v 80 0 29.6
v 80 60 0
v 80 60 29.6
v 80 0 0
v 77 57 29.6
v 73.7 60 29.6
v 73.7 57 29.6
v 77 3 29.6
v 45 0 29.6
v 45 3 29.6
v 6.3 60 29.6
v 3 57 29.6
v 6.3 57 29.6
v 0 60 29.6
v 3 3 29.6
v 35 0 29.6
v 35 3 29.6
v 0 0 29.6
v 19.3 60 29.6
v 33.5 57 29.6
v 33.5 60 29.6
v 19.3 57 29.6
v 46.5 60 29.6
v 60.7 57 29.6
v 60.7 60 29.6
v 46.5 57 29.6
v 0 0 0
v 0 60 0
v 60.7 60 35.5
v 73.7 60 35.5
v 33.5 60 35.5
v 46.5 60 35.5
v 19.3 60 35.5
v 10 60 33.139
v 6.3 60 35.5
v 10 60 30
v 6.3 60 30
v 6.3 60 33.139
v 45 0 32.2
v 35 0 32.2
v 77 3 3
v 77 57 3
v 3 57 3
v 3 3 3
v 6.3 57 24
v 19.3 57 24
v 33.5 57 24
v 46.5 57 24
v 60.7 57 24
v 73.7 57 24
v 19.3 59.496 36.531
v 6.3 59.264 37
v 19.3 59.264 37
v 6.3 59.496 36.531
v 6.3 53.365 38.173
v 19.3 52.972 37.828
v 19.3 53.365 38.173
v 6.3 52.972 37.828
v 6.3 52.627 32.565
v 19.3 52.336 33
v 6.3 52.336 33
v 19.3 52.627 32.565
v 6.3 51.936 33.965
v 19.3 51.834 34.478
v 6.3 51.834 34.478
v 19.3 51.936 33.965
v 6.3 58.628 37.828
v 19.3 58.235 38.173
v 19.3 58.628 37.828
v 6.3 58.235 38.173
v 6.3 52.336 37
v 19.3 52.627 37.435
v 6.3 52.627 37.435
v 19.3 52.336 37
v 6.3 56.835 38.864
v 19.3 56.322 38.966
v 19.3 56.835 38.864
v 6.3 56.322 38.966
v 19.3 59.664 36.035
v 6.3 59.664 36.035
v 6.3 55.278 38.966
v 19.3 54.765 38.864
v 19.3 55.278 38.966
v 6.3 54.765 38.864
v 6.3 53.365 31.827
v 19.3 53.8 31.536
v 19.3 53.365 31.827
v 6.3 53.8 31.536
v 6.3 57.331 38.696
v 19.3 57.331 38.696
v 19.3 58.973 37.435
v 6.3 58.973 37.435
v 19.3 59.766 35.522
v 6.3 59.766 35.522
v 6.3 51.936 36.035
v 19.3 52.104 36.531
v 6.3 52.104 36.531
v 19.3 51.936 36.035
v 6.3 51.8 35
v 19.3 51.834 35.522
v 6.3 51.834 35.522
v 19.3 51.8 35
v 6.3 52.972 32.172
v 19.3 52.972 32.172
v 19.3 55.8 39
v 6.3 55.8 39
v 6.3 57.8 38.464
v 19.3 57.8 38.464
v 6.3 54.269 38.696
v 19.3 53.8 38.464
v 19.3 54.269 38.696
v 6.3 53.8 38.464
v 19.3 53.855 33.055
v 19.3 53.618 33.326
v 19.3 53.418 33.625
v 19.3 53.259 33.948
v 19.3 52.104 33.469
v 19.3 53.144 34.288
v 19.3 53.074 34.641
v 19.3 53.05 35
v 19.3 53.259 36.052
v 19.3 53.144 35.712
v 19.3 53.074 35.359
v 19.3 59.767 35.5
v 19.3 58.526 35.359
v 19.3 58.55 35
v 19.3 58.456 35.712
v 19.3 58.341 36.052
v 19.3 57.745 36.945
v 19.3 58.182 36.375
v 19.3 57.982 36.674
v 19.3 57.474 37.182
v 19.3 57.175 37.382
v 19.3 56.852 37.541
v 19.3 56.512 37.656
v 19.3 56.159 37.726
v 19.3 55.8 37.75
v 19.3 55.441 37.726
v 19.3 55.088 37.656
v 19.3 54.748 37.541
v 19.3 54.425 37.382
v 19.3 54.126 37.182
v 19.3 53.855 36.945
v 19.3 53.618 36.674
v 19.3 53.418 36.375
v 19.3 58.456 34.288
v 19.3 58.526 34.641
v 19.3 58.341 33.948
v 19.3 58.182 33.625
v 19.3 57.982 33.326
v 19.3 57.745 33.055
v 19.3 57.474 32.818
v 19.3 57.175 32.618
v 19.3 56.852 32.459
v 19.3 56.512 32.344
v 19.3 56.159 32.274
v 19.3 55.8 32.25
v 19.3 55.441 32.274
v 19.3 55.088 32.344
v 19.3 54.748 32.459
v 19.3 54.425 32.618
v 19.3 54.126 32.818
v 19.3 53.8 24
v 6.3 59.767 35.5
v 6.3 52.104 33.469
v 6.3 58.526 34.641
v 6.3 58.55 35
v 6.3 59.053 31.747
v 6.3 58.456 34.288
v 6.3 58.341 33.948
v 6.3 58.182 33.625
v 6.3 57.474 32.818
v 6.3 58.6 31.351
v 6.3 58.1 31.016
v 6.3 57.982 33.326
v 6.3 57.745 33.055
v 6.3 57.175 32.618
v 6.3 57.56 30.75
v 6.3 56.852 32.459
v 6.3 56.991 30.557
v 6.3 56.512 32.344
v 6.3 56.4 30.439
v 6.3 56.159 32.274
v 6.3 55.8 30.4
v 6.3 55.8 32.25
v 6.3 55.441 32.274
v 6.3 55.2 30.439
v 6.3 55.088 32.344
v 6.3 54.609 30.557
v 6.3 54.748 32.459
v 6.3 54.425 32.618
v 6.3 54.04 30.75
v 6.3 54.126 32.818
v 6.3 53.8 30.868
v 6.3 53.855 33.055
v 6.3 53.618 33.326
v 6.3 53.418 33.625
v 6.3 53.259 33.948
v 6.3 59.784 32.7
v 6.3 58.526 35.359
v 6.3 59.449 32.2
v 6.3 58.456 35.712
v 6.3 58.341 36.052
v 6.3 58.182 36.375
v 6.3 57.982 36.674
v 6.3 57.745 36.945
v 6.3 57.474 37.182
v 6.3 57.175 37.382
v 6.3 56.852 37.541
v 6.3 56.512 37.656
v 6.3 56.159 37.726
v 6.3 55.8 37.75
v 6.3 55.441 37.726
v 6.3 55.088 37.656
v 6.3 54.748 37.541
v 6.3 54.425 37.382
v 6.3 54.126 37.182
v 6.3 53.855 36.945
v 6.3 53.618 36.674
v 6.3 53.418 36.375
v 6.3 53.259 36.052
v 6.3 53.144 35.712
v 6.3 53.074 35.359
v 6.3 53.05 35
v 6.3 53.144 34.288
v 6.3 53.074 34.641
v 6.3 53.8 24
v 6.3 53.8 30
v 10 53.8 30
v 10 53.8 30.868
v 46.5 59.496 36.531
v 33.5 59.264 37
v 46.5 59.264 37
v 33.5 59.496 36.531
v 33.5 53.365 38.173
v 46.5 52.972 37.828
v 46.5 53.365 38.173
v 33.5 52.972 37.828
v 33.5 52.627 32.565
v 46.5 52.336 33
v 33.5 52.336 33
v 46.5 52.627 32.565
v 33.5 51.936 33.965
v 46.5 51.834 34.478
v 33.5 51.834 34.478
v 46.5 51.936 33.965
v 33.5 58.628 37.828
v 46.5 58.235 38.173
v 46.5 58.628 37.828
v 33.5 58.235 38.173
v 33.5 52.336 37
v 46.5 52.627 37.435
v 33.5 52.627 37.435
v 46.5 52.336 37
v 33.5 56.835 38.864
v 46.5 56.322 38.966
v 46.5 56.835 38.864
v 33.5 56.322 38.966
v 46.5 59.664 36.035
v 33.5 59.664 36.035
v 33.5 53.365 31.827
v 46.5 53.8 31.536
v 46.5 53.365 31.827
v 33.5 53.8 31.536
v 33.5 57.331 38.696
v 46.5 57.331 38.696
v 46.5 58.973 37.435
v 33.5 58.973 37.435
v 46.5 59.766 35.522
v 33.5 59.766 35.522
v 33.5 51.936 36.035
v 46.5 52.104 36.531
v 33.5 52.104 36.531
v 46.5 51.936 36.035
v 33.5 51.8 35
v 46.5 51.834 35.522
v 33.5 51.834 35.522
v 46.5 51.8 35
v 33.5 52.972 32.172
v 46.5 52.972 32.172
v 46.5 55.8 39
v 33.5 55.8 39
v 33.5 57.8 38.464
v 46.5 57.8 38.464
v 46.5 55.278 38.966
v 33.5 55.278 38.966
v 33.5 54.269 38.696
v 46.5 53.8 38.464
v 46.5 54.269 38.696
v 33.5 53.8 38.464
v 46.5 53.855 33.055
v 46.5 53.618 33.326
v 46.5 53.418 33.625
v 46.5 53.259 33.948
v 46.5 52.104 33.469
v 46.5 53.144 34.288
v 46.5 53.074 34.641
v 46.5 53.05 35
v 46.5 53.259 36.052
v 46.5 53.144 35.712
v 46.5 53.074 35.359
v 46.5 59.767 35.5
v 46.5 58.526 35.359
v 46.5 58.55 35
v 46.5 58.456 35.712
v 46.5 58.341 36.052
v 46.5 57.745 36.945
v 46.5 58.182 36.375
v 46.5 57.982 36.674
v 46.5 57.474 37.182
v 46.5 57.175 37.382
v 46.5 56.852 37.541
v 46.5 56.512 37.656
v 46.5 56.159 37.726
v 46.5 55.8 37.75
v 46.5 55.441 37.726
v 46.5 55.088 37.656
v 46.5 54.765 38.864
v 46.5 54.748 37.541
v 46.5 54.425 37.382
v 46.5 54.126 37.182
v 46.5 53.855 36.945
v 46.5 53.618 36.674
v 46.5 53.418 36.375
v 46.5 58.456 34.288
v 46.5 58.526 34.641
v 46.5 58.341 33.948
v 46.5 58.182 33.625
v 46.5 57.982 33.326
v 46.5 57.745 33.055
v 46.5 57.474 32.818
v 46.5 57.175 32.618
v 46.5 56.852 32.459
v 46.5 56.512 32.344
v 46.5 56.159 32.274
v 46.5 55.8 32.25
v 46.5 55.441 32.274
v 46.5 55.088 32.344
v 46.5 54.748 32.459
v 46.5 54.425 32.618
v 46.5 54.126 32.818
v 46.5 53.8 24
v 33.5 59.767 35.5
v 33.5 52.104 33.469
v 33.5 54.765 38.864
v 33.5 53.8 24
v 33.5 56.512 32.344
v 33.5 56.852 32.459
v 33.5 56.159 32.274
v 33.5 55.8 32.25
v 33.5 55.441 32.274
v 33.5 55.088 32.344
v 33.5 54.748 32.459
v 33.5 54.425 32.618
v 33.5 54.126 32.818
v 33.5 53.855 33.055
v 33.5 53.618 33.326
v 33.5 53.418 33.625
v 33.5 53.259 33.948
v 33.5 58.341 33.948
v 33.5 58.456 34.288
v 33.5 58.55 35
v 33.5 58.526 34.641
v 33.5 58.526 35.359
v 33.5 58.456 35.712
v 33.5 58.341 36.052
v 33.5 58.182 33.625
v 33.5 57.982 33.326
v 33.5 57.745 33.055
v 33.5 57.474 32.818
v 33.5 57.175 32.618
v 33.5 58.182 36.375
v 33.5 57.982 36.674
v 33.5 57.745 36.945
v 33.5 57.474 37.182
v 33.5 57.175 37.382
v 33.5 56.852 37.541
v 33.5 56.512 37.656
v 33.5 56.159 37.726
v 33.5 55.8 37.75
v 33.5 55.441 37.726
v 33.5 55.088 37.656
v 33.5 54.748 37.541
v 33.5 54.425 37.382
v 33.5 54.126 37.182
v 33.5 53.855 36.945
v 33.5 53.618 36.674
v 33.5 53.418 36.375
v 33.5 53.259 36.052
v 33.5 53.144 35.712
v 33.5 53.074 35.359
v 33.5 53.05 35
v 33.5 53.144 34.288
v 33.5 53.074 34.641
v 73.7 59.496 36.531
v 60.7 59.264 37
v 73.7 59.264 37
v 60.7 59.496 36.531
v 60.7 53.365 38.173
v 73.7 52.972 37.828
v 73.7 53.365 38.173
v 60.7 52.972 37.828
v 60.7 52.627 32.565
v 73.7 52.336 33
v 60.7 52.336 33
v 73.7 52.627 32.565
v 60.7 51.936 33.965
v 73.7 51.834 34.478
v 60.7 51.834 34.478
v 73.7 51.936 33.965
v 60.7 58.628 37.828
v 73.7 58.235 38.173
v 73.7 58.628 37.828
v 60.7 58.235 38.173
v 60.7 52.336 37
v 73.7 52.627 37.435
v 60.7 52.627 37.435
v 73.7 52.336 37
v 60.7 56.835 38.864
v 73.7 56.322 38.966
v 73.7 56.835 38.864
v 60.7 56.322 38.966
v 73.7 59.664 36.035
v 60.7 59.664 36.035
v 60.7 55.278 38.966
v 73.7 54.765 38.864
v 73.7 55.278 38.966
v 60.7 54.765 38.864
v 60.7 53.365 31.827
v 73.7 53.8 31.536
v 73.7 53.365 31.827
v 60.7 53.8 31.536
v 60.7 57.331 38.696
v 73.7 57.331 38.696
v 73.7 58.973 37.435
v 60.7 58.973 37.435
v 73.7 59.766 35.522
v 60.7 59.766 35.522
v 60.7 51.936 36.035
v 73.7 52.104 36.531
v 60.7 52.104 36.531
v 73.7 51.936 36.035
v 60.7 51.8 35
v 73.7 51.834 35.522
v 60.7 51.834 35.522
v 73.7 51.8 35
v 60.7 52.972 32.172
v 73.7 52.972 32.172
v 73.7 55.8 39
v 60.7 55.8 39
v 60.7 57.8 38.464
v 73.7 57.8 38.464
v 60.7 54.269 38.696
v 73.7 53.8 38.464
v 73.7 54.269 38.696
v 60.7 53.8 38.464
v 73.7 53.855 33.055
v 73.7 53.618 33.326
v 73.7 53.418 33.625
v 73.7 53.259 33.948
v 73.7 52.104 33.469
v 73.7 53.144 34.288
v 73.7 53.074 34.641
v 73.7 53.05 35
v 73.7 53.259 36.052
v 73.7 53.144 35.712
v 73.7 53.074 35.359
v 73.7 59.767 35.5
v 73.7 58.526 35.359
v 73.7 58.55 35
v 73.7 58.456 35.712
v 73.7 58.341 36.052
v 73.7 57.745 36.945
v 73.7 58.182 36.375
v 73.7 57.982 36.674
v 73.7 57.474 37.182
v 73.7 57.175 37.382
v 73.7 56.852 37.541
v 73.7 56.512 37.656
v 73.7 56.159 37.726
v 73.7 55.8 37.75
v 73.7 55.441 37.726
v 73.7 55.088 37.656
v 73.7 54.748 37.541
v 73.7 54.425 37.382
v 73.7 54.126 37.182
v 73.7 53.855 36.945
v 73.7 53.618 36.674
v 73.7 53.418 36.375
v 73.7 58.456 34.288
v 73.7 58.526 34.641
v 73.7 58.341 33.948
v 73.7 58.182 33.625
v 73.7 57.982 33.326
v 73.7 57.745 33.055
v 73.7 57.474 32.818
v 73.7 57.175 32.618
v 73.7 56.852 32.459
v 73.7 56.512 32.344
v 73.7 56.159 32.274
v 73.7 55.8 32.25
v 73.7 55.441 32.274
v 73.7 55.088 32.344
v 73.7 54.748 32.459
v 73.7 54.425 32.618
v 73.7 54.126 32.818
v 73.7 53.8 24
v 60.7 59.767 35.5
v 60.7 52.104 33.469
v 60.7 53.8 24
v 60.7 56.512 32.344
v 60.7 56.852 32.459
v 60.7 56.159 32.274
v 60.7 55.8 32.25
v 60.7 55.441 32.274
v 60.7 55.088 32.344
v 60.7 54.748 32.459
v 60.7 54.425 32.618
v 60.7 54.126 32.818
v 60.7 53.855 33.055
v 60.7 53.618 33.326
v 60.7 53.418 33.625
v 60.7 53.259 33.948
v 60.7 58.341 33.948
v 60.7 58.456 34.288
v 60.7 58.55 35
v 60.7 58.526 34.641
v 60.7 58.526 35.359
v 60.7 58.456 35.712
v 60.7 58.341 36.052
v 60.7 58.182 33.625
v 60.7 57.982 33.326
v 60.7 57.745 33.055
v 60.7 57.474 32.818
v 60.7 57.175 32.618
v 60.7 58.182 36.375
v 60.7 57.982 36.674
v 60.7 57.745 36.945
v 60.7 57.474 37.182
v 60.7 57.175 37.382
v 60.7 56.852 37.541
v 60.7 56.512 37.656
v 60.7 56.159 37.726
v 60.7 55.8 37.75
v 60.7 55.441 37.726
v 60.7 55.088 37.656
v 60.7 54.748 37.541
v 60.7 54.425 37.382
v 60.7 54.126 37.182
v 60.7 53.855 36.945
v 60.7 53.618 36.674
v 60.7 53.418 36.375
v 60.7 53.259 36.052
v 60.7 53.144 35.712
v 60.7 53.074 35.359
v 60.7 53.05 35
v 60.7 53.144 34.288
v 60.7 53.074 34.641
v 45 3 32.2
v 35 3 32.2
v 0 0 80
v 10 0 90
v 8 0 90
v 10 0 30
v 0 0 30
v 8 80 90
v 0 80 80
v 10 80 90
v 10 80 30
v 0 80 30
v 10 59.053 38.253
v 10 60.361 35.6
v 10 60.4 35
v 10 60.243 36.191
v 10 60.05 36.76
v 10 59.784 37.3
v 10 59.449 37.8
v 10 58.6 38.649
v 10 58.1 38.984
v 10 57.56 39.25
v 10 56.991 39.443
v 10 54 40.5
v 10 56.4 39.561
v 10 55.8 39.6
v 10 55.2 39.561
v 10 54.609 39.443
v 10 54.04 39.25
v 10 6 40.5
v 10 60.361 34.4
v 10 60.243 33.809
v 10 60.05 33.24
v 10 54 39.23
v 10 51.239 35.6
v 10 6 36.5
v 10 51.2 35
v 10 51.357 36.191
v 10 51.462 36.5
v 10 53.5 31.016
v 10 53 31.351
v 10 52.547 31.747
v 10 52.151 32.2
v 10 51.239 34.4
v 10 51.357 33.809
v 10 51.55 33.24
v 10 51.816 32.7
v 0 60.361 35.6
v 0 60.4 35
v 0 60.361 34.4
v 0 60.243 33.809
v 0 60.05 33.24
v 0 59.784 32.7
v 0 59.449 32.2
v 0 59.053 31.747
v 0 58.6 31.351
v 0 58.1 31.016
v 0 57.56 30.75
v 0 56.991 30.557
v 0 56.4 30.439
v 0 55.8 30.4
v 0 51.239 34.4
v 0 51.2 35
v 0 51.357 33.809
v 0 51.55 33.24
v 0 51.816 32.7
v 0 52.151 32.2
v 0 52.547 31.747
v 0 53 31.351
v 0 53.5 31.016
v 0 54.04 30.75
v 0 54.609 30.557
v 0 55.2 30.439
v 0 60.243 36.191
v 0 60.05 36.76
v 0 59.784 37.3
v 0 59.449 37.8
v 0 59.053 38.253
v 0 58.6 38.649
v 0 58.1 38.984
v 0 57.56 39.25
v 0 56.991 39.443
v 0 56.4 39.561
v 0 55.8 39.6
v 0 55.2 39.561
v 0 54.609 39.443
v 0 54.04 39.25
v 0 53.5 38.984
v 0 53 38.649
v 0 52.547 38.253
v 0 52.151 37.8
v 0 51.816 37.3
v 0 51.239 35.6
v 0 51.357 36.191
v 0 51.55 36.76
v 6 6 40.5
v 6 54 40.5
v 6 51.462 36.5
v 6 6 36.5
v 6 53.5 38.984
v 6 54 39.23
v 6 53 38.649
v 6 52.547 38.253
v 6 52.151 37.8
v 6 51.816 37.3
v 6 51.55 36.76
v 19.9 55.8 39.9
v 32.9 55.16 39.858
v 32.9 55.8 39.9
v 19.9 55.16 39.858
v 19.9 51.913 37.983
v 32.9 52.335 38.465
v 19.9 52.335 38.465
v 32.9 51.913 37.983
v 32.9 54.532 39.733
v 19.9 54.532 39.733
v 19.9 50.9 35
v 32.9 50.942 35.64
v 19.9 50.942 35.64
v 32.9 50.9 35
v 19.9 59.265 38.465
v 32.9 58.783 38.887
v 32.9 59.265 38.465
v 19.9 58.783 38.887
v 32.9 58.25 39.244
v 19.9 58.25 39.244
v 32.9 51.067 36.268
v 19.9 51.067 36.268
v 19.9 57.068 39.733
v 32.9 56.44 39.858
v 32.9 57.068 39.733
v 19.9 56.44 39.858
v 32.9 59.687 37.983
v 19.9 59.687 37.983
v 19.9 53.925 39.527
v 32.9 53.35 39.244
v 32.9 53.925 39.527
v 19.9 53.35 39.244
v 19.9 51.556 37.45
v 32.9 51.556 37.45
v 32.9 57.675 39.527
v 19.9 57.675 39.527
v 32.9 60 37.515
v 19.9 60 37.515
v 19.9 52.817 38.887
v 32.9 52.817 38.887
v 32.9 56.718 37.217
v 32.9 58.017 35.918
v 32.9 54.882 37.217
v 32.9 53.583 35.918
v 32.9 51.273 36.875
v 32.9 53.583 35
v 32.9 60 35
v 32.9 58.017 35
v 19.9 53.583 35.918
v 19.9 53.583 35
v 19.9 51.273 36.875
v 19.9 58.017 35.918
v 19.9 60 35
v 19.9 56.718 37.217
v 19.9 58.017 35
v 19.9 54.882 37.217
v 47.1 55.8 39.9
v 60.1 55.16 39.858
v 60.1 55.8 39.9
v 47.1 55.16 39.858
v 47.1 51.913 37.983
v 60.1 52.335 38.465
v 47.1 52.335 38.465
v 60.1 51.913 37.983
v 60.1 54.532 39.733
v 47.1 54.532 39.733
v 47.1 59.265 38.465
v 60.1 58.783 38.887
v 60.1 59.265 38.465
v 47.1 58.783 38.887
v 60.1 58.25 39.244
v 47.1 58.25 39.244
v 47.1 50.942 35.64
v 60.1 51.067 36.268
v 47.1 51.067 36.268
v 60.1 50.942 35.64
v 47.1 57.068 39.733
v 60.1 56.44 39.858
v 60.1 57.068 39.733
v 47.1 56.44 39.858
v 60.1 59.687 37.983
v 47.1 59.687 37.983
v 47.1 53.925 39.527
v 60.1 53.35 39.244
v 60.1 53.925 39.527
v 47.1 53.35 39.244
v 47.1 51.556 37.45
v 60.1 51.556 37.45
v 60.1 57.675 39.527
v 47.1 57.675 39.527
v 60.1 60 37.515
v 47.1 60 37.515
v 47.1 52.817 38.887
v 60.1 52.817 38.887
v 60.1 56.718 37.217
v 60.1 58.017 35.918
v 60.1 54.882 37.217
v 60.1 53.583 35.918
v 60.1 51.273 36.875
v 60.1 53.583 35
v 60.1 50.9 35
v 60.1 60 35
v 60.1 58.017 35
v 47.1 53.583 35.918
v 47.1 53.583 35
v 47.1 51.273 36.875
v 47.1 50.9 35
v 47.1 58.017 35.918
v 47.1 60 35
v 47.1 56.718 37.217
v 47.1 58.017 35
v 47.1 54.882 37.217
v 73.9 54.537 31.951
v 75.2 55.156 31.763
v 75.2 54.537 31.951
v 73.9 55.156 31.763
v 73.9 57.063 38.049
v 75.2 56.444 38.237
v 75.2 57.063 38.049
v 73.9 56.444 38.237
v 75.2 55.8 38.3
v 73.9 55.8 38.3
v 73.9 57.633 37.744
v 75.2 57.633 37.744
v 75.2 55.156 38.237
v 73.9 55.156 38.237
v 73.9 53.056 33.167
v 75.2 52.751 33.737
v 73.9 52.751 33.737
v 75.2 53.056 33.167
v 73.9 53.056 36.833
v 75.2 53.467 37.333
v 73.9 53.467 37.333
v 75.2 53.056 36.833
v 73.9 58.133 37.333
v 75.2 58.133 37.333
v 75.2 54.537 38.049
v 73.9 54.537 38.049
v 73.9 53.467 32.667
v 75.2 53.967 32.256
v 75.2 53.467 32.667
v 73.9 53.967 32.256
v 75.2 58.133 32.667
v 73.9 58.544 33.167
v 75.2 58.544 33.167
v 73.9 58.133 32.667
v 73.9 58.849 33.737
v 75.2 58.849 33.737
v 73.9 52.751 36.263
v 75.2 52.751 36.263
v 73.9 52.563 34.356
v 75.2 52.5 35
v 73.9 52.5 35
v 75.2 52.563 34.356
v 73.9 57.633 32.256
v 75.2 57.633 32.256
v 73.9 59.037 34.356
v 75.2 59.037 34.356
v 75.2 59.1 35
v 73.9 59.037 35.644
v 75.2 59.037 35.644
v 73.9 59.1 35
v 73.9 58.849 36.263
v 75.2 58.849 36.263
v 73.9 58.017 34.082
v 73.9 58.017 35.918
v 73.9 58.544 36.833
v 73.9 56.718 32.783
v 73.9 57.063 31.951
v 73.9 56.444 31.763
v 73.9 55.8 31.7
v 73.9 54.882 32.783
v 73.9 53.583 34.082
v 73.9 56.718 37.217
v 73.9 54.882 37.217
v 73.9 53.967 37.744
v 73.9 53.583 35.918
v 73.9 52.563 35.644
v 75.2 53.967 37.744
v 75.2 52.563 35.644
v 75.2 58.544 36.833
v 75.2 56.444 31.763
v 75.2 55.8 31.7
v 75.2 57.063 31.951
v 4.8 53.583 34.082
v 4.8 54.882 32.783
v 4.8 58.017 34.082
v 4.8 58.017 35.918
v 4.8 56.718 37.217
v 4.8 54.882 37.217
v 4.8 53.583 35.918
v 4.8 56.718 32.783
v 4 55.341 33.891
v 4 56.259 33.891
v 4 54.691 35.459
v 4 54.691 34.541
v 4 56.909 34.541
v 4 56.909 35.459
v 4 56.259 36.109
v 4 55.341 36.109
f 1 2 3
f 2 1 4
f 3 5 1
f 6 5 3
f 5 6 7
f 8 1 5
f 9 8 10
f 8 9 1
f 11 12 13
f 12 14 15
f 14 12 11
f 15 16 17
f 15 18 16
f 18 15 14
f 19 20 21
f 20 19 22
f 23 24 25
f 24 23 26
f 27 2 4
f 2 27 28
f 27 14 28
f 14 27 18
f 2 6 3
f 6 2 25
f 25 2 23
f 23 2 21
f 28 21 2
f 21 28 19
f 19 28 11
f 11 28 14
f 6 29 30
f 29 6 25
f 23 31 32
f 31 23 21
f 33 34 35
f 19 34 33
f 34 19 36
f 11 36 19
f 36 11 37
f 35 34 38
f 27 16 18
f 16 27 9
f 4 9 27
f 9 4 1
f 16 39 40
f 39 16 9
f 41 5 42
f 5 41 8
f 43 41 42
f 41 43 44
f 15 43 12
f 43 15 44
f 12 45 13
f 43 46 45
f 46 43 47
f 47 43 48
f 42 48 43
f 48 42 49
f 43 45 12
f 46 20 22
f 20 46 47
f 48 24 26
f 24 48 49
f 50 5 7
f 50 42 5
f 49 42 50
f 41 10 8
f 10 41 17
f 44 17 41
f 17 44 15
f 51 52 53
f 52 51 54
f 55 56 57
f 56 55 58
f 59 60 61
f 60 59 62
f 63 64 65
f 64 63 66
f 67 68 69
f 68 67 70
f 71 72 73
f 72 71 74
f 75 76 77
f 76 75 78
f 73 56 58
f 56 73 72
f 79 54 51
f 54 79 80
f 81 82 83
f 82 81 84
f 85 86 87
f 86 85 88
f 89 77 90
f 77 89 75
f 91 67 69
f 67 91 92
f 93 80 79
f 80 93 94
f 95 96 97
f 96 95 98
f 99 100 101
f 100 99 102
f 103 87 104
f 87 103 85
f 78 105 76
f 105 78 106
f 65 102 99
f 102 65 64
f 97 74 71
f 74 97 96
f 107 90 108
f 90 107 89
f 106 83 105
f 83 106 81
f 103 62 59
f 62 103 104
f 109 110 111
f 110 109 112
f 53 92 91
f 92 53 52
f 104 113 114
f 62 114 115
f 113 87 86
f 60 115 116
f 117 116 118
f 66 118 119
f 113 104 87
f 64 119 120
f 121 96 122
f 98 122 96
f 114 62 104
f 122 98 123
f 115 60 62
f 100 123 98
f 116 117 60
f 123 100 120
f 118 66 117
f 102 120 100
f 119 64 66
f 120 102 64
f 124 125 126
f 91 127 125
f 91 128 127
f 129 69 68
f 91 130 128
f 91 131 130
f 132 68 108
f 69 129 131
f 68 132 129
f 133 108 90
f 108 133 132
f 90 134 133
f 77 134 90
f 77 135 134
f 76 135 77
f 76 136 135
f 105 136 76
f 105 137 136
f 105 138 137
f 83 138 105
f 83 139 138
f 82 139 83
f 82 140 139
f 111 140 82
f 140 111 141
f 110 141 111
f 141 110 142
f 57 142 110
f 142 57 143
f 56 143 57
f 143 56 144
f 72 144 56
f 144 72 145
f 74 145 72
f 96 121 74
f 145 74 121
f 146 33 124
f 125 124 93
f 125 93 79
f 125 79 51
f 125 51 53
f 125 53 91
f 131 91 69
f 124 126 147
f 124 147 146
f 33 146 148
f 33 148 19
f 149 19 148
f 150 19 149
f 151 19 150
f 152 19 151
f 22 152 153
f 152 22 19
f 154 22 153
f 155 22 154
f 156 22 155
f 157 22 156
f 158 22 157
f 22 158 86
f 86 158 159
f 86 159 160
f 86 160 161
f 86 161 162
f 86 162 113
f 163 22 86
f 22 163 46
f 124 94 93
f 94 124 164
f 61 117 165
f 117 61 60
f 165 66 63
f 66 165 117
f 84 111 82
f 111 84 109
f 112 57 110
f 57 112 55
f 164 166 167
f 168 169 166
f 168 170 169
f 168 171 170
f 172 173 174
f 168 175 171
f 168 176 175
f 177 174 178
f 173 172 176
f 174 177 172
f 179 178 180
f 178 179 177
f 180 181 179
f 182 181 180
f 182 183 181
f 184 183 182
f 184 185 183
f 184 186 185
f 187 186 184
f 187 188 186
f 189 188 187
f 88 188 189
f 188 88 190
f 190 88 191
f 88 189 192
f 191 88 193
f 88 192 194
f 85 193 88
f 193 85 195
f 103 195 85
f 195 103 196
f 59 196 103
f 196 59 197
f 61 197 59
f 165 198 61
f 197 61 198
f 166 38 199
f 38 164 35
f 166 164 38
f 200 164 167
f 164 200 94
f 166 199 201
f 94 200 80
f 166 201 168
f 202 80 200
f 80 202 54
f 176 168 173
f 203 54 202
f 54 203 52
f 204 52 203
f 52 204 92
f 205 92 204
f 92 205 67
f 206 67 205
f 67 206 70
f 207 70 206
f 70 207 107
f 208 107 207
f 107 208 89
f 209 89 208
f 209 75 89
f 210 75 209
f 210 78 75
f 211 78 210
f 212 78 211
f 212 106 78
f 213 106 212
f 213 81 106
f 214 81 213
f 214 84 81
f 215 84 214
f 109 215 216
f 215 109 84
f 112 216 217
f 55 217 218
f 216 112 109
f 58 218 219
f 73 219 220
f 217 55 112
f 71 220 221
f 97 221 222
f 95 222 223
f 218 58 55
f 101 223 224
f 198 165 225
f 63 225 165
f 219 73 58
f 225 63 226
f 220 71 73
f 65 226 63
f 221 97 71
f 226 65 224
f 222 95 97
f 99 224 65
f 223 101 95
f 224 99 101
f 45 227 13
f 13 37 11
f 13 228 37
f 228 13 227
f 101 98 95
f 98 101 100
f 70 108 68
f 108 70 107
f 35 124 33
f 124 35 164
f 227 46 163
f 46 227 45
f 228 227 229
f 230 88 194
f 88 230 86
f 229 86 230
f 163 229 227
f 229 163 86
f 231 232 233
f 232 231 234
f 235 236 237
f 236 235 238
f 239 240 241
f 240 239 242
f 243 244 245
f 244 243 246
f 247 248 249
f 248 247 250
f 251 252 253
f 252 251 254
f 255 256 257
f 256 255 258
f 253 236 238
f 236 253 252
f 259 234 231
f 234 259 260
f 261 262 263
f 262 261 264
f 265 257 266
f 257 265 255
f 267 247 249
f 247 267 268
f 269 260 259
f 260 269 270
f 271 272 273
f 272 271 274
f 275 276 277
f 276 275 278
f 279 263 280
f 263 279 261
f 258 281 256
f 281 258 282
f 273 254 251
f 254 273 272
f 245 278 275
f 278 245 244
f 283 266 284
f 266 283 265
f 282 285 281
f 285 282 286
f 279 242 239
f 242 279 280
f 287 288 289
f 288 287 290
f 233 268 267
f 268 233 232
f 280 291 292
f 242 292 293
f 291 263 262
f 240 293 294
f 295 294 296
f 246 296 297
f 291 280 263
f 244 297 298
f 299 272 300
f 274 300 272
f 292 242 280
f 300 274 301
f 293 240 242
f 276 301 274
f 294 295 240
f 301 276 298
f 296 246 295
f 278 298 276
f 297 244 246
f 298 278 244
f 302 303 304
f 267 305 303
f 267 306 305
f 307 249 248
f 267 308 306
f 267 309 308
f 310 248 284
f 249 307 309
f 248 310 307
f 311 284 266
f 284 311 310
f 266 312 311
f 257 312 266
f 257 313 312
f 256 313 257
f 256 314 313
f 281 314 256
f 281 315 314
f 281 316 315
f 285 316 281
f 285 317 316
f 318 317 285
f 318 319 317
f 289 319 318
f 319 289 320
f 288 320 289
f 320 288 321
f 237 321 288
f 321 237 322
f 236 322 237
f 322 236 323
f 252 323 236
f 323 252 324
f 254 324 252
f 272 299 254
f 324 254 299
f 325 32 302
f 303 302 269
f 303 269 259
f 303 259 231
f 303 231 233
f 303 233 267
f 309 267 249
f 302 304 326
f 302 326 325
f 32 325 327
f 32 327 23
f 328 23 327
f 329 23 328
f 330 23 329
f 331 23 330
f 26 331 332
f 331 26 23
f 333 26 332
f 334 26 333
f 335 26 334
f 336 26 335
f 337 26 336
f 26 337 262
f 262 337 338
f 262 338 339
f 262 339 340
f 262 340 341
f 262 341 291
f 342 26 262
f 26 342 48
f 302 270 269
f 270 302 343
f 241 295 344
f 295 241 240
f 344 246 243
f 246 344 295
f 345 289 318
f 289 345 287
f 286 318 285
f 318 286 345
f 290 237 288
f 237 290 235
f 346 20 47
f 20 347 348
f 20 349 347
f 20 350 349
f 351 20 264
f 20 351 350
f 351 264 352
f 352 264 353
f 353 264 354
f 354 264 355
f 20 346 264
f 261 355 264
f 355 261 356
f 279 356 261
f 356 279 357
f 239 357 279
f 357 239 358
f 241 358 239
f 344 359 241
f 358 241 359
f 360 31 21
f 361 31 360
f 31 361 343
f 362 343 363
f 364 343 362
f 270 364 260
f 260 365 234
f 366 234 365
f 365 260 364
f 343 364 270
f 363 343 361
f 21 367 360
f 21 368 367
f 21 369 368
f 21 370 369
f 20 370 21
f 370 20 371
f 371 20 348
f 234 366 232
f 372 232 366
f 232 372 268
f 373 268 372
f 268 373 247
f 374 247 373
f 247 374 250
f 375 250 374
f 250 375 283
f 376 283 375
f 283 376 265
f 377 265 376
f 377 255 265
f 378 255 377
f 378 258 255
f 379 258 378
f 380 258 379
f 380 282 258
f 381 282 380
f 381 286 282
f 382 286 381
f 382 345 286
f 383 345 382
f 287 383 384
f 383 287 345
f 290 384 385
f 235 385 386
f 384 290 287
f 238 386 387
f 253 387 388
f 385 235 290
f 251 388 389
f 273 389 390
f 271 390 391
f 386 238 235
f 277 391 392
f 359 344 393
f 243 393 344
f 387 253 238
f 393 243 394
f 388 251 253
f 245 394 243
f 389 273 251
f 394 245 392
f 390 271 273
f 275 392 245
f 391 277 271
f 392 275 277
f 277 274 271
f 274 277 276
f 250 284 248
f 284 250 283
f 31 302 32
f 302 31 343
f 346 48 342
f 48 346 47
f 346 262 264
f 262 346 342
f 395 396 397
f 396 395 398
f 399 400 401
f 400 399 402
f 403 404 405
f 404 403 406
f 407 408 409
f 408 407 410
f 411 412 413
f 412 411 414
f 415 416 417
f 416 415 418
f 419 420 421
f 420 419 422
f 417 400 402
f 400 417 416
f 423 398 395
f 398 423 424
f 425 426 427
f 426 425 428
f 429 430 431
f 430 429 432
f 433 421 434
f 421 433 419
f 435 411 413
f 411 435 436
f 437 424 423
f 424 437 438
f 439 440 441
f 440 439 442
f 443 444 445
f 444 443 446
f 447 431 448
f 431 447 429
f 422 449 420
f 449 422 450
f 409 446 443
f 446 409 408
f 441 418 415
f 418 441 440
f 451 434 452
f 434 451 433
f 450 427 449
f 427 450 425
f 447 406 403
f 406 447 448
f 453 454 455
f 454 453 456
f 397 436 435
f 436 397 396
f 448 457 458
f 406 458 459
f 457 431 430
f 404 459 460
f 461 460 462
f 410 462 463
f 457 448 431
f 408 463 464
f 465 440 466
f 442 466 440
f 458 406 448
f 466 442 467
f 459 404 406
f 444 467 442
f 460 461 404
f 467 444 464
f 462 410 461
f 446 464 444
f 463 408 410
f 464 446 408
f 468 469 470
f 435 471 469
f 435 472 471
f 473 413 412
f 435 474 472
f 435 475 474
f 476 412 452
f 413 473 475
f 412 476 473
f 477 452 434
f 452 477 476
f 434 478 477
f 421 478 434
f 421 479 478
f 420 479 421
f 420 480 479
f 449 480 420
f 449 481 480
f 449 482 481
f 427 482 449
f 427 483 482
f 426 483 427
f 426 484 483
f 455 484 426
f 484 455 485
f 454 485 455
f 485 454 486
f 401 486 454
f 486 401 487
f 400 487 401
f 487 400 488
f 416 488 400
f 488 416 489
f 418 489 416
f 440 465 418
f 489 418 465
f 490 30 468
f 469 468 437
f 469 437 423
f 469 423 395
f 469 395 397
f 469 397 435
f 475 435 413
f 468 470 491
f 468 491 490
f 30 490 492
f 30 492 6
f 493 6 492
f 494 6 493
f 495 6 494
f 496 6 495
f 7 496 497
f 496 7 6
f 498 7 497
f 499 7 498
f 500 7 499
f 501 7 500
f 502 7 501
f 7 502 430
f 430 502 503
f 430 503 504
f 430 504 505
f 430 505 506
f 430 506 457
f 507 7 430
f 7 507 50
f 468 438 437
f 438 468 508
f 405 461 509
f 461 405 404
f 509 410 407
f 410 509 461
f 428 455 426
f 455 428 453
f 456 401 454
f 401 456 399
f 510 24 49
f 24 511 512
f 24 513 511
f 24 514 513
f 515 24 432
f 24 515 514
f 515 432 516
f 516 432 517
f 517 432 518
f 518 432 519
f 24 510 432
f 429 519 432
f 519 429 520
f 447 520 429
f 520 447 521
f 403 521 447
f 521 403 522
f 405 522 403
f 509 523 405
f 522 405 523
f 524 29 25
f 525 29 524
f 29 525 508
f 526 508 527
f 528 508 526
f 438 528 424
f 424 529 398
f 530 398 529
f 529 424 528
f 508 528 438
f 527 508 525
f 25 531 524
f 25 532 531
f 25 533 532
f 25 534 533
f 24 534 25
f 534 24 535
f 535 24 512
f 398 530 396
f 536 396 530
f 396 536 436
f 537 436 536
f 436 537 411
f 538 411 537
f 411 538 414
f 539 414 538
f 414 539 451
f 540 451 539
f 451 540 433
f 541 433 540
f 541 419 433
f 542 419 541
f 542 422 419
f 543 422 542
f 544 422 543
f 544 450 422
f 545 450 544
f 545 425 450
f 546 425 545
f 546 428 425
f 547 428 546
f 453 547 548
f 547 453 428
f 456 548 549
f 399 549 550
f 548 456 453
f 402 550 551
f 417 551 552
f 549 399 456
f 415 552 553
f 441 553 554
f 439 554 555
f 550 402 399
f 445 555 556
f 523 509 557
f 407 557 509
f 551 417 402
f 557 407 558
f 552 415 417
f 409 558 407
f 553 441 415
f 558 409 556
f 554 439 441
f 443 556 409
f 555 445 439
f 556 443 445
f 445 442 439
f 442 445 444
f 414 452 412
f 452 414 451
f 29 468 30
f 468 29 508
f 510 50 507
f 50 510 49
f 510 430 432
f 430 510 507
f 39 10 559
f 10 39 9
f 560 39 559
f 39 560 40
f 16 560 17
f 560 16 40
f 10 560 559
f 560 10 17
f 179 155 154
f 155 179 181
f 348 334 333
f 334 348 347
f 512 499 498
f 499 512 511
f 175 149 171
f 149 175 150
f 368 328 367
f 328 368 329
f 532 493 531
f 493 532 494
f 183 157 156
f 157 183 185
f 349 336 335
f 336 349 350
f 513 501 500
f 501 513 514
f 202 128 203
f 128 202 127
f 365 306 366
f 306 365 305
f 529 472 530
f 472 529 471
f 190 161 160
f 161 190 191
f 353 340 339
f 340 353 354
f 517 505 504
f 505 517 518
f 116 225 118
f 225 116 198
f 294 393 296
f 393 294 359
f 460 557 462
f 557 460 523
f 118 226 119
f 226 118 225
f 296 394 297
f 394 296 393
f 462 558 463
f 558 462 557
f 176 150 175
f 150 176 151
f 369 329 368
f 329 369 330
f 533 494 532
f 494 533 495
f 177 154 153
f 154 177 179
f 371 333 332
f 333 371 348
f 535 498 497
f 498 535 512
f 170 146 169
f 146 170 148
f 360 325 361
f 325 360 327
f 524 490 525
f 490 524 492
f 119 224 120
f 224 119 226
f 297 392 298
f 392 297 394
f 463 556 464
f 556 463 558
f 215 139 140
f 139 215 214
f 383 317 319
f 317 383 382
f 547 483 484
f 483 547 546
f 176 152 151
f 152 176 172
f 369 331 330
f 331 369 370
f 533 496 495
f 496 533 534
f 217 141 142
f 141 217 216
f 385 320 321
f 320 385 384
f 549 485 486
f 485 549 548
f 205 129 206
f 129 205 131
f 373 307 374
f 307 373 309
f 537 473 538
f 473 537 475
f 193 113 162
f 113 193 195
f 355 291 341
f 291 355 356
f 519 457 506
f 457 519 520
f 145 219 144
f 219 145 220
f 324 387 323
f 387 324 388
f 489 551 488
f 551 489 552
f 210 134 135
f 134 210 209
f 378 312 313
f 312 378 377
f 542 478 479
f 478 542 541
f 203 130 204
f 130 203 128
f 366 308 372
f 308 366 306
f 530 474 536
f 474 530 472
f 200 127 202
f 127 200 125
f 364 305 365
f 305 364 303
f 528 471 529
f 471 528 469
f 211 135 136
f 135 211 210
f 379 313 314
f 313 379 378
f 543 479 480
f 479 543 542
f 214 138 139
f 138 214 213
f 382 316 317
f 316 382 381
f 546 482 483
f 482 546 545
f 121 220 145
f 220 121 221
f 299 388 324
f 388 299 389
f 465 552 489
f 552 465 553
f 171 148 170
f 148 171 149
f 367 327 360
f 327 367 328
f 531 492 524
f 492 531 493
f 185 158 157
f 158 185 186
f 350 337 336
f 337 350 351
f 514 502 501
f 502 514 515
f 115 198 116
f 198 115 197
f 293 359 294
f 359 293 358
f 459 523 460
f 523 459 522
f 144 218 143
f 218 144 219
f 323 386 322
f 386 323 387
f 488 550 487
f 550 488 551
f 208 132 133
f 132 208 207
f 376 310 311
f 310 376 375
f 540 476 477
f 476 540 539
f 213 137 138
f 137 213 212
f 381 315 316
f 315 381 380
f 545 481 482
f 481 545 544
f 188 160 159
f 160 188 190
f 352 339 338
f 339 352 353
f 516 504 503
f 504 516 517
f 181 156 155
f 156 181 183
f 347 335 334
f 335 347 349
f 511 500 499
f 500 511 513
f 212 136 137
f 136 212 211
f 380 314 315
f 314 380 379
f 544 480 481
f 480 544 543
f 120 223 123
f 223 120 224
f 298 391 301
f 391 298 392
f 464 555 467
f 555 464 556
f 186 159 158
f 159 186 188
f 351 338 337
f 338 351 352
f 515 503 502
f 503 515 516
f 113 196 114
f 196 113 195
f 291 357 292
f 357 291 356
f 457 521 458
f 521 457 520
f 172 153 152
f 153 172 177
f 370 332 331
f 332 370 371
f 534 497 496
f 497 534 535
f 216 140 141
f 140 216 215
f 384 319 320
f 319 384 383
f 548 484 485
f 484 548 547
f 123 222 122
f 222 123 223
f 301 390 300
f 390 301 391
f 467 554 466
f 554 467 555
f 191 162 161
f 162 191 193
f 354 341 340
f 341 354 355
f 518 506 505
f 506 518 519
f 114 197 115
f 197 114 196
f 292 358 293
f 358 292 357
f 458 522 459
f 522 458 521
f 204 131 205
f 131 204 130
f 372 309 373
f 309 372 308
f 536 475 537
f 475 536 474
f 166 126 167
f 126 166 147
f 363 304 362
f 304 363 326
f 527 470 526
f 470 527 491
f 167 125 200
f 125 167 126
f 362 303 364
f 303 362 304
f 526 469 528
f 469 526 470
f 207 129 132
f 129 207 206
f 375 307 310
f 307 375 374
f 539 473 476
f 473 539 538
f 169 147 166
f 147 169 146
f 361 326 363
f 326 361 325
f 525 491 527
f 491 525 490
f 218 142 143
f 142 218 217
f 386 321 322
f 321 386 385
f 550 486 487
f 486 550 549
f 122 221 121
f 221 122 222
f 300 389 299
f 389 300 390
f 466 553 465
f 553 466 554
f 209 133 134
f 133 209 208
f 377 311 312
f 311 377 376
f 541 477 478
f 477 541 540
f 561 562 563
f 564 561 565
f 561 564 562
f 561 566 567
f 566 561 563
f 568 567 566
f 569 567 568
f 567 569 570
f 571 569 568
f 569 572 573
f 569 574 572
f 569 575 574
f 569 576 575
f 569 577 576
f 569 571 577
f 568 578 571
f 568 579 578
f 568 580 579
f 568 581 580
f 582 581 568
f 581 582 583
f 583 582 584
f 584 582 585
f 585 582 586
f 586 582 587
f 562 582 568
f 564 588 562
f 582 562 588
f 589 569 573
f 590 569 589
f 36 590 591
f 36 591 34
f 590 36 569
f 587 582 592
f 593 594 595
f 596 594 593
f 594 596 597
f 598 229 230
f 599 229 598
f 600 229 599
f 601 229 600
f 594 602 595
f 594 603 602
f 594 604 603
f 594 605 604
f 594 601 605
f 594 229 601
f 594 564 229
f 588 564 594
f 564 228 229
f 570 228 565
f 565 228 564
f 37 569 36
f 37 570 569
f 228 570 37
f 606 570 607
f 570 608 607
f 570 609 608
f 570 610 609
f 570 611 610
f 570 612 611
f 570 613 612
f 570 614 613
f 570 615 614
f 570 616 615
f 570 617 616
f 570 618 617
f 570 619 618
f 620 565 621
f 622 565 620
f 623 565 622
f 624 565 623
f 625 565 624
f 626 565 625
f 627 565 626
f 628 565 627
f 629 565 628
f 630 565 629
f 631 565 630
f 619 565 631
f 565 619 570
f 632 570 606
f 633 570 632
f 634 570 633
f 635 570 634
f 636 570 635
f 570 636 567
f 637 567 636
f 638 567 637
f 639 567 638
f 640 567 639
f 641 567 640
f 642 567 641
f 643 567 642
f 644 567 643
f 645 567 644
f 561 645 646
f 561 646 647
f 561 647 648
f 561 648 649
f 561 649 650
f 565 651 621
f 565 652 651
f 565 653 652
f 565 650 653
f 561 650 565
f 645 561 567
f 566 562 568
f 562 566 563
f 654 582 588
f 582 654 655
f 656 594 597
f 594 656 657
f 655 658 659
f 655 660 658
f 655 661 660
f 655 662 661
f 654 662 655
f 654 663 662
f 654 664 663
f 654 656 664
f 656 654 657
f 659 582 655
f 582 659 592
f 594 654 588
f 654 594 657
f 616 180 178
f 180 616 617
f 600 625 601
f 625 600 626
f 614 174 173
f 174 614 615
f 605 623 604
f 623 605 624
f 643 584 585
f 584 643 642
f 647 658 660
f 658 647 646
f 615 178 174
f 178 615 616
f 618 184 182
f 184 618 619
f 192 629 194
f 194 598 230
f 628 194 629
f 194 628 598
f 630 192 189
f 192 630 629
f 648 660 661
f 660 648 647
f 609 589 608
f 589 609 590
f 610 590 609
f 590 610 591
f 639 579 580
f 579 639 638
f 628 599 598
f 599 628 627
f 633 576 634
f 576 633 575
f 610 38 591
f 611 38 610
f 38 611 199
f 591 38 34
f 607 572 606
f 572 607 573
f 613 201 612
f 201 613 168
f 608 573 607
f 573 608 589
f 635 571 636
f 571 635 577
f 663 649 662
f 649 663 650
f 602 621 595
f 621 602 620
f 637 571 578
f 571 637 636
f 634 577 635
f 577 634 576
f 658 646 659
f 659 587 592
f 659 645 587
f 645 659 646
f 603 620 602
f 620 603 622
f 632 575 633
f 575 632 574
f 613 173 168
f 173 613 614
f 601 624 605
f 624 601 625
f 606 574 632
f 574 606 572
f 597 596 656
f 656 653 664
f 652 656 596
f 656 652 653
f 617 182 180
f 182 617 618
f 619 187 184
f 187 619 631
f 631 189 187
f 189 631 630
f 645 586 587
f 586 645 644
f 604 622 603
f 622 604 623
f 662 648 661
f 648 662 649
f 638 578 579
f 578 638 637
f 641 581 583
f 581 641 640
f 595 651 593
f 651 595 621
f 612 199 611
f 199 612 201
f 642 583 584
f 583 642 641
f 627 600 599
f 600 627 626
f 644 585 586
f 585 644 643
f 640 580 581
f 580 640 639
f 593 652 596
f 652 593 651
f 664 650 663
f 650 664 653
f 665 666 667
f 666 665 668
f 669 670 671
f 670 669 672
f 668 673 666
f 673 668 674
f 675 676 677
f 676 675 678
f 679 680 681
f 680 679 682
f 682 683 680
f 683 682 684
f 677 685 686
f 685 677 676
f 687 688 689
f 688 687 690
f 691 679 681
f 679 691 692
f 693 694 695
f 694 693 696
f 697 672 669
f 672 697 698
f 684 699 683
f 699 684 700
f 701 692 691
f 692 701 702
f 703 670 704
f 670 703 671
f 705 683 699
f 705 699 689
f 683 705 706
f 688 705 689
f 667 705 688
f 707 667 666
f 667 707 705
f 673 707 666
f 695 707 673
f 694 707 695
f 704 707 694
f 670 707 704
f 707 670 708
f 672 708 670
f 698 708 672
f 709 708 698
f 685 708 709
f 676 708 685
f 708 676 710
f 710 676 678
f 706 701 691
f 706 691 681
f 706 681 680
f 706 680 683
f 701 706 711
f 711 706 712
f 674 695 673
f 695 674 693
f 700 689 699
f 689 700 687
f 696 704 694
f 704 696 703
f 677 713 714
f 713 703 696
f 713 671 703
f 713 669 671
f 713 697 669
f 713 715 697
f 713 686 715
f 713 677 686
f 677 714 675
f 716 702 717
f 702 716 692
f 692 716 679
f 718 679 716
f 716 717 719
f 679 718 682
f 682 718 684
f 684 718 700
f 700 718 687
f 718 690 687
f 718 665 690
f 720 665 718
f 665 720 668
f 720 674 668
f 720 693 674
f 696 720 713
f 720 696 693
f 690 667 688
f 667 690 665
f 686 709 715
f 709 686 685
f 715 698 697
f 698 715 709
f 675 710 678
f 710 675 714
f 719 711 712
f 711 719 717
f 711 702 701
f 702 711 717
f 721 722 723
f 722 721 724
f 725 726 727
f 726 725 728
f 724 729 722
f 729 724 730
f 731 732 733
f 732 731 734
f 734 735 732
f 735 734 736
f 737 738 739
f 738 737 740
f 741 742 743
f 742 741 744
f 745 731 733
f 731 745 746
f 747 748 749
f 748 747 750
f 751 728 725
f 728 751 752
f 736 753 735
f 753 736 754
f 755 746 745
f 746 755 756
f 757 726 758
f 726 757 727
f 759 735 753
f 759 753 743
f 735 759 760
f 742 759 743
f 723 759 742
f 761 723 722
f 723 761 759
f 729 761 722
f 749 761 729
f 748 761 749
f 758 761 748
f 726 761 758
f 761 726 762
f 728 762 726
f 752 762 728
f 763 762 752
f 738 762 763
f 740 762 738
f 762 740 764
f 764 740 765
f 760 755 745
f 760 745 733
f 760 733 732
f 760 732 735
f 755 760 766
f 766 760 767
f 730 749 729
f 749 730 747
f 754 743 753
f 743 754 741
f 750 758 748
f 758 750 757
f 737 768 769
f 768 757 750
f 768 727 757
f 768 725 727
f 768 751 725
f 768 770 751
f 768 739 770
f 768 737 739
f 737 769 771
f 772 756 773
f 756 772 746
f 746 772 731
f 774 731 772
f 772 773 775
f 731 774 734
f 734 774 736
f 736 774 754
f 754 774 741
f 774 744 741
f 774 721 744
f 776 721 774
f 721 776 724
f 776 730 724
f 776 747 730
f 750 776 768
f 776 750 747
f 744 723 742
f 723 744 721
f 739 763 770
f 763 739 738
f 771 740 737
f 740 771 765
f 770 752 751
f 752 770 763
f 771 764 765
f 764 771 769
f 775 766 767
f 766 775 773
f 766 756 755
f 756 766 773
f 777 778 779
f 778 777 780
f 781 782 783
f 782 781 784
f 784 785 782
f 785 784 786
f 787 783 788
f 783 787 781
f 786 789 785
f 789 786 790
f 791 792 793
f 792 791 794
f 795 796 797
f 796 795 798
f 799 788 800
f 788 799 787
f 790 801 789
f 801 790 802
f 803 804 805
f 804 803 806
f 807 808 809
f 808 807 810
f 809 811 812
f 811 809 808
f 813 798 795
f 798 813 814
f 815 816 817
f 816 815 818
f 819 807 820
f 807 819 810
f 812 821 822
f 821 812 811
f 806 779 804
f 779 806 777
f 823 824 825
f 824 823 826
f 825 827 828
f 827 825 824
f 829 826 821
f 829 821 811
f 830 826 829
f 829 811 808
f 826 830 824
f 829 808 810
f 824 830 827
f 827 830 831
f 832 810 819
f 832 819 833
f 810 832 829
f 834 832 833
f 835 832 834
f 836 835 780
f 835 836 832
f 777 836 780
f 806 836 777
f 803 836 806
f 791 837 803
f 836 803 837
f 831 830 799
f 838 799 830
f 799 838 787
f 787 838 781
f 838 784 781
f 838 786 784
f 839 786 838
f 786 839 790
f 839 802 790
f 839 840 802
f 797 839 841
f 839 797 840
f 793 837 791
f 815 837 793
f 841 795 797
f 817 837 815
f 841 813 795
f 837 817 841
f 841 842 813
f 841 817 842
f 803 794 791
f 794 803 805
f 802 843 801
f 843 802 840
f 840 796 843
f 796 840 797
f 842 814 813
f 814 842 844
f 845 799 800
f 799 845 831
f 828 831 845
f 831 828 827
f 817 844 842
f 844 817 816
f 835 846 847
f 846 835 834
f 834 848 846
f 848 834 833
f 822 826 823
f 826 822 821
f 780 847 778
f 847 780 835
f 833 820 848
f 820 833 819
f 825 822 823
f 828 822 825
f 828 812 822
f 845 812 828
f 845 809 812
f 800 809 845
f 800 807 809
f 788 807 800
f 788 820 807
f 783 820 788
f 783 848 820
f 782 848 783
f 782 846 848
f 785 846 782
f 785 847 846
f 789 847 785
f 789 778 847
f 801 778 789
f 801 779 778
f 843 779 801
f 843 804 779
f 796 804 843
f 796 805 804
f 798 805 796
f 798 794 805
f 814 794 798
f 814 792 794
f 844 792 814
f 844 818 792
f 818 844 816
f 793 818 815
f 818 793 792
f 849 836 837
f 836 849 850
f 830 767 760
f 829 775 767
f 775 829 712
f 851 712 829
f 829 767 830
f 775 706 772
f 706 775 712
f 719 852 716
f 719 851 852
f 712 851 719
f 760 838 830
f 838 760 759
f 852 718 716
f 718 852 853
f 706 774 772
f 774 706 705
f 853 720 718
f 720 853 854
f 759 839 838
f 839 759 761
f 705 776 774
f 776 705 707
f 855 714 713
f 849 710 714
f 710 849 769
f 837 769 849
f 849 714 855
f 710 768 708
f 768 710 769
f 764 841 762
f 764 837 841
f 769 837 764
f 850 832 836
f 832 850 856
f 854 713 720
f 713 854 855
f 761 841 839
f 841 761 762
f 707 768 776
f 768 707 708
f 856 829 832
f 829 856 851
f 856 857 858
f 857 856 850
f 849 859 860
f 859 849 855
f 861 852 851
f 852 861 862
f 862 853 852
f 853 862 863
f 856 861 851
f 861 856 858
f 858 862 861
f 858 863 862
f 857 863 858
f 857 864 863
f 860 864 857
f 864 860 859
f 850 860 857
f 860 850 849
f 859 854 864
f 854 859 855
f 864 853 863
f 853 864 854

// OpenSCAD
// Print-in-place hinged box, 80 x 60 x 40 mm closed.
// Printed closed in PLA (Bambu A1, 0.4 nozzle): base, lid and a captive
// hinge pin are separate bodies with 0.35-0.6 mm clearances, so the hinge
// breaks free by hand.  No supports: the lid underside bridges the cavity,
// the hinge barrels/pin use faceted (octagonal) lower surfaces, and all
// other downward faces are short bridges or rest on the body below.

/* [Part] */
part = "assembly"; // [assembly, box, lid, pin]

/* [Dimensions] */
box_w = 80;          // X, outside
box_d = 60;          // Y, outside (front y=0, back y=60)
box_h = 29.6;        // base height to its rim
lid_h = 10;          // lid height; lid bottom at z=30 (0.4 gap)
lid_z = 30;
wall = 3;
floor_t = 3;
total_h = 40;

hinge_y = 55.8;      // hinge axis, assembly coords
hinge_z = 35;
barrel_r = 4.0;
pin_r = 2.4;         // octagon circumradius
bore_r = 2.75;       // pin_r + 0.35 radial clearance
relief_r = 4.6;      // barrel_r + 0.6

// Alternating knuckles along the back edge (x intervals), 0.6 mm end gaps.
box_segs  = [[6.3, 19.3], [33.5, 46.5], [60.7, 73.7]];
lid_segs  = [[19.9, 32.9], [47.1, 60.1]];

cadverify_only = "";
module instance(name, part_name, unit = 1) {
    echo(cadverify_instance = [name, part_name, unit]);
    if (cadverify_only == "" || cadverify_only == name) children();
}

// ---------------------------------------------------------------- base (box)
module box_main() {
    difference() {
        union() {
            // shell: outer block minus open-top cavity
            difference() {
                cube([box_w, box_d, box_h]);
                translate([wall, wall, floor_t]) cube([box_w - 2 * wall, box_d - 2 * wall, box_h]);
            }
            // hinge knuckles (base) + support posts down to the back wall
            for (s = box_segs) {
                translate([s[0], hinge_y, hinge_z]) rotate([0, 90, 0])
                    cylinder(h = s[1] - s[0], r = barrel_r, $fn = 48);
                translate([s[0], 53.8, 24]) cube([s[1] - s[0], 6.2, 11.5]);
            }
            // front catch tooth (enters the socket in the lid)
            translate([35, 0, box_h]) cube([10, wall, 2.6]);
        }
        // pin bore through the base knuckles
        translate([-1, hinge_y, hinge_z]) rotate([0, 90, 0])
            cylinder(h = box_w + 2, r = bore_r, $fn = 48);
    }
}

// ---------------------------------------------------------------- lid (local: z 0..10, hinge axis at z=5)
module lid_main() {
    union() {
        difference() {
            union() {
                // main slab, side profile (Y-Z) extruded along X.
                // Rear lower edge chamfered 50,0 -> 60,8 so the slab
                // swings clear of the base back wall.
                multmatrix([[0, 1, 0, 0], [0, 0, 1, 0], [1, 0, 0, 0], [0, 0, 0, 1]])
                    linear_extrude(height = box_w)
                        polygon(points = [[0, 0], [50, 0], [60, 8], [60, 10], [0, 10]]);
                // hinge knuckles (lid)
                for (s = lid_segs)
                    translate([s[0], hinge_y, 5]) rotate([0, 90, 0])
                        cylinder(h = s[1] - s[0], r = barrel_r, $fn = 48);
            }
            // recessed panel in the top face
            translate([6, 6, 6.5]) cube([68, 48, 4]);
            // front catch socket (tooth: x35..45, z assy 29.6..32.2)
            translate([34.4, -1, -0.5]) cube([11.2, 4.6, 3.2]);
            // clearance tunnel for the base knuckles / pin
            translate([-1, hinge_y, 5]) rotate([0, 90, 0])
                cylinder(h = box_w + 2, r = relief_r, $fn = 48);
            // pin bore through the lid knuckles
            translate([-1, hinge_y, 5]) rotate([0, 90, 0])
                cylinder(h = box_w + 2, r = bore_r, $fn = 48);
        }
        // webs joining lid knuckles to the slab: upper half-discs r=4.9
        // (stay above z=30.1 in assembly, clear of the base rim at 29.6)
        for (s = lid_segs)
            intersection() {
                translate([s[0], hinge_y, 5]) rotate([0, 90, 0])
                    cylinder(h = s[1] - s[0], r = 4.9, $fn = 48);
                translate([s[0], hinge_y - 10, 5]) cube([s[1] - s[0], 20, 5]);
                translate([s[0], 0, 0]) cube([s[1] - s[0], box_d, lid_h]);
            }
    }
}

// ---------------------------------------------------------------- pin
// Centred on its axis, local +Z from head (z=0) to tip (z=71.2).
module pin_geom() {
    union() {
        cylinder(h = 1.3, r = 3.3, $fn = 32);                    // head
        translate([0, 0, 1.3]) rotate([0, 0, 22.5])
            cylinder(h = 69.1, r = pin_r, $fn = 8);              // octagonal shaft
        translate([0, 0, 70.4]) rotate([0, 0, 22.5])
            cylinder(h = 0.8, r1 = pin_r, r2 = 1.2, $fn = 8);    // lead-in tip
    }
}
module pin_part() { translate([3.3, 3.3, 0]) pin_geom(); }

// ---------------------------------------------------------------- output
if (part == "box") {
    echo(cadverify_spec = [
        ["bounds", [[0, 0, 0], [box_w, box_d, hinge_z + barrel_r]]],
        ["bodies", 1],
        ["copies", 1],
        ["support_faces", [["bed", "-z", 4000]]],
        ["overhangs_allowed", [["hinge knuckles and pin bore print in place; faceted bore ceiling is a short internal bridge", [[5, 51, 30], [75, 60, 39.5]]]]],
        ["details", [
            ["cavity", "void", [[4, 4, 10], [76, 53, 29]], 0.95],
            ["front_wall", "thickness", [40, -1, 15], [0, 1, 0], 3],
            ["floor", "thickness", [40, 30, -1], [0, 0, 1], 3],
            ["box_knuckle", "material", [[7, 54, 33], [18, 58, 37]], 0.5],
            ["pin_bore", "void", [[8, 54.5, 33.5], [17, 57, 36.5]], 0.55],
            ["catch_tooth", "material", [[36, 0.5, 30], [44, 2.5, 32]], 0.85],
            ["hinge_knuckles", "view", [[4, 50, 28], [76, 60, 39.5]]]
        ]]
    ]);
    box_main();
} else if (part == "lid") {
    echo(cadverify_spec = [
        ["bounds", [[0, 0, 0], [box_w, box_d, lid_h]]],
        ["bodies", 1],
        ["copies", 1],
        ["support_faces", [["print_face", "-z", 3000]]],
        ["overhangs_allowed", [["lid knuckle bores print in place around the pin; bore ceilings are short internal bridges", [[5, 51, 0], [75, 60, 10]]]]],
        ["details", [
            ["top_pocket", "void", [[7, 7, 6.6], [73, 53, 9.9]], 0.95],
            ["lid_slab", "thickness", [40, 30, 9], [0, 0, -1], 6.5],
            ["lid_knuckle", "material", [[21, 54, 3], [32, 58, 7]], 0.5],
            ["pin_bore", "void", [[22, 54.5, 3.5], [31, 57, 6.5]], 0.55],
            ["catch_socket", "void", [[35, 0.5, 0.2], [45, 2.5, 2.5]], 0.9],
            ["hinge_knuckles", "view", [[4, 50, 0], [76, 60, 10]]]
        ]]
    ]);
    lid_main();
} else if (part == "pin") {
    echo(cadverify_spec = [
        ["bounds", [[0, 0, 0], [6.6, 6.6, 71.2]]],
        ["bodies", 1],
        ["copies", 1],
        ["support_faces", [["head_base", "-z", 30]]],
        ["overhangs_allowed", []],
        ["details", [
            ["pin_shaft", "material", [[2, 2, 10], [4.6, 4.6, 20]], 0.9],
            ["pin_head", "material", [[1, 1, 0.1], [5.6, 5.6, 1.2]], 0.75],
            ["pin_length", "thickness", [3.3, 3.3, 72], [0, 0, -1], 71.2],
            ["pin_head_view", "view", [[0, 0, 0], [6.6, 6.6, 2]]]
        ]]
    ]);
    pin_part();
} else if (part == "assembly") {
    echo(cadverify_spec = [
        ["bounds", [[0, 0, 0], [box_w, box_d, total_h]]],
        ["support_faces", [["bed", "-z", 4000]]],
        ["allowed_interferences", []],
        ["motions", [
            ["lid_swing", ["lid"], "rotate", [0, hinge_y, hinge_z], [-1, 0, 0], [0, 110]]
        ]],
        ["assembly_order", [
            [["base"], [0, 0, 0]],
            [["lid"], [0, 0, -1]],
            [["pin"], [-1, 0, 0]]
        ]]
    ]);
    instance("base", "box") box_main();
    instance("lid", "lid") translate([0, 0, lid_z]) lid_main();
    instance("pin", "pin") translate([75.2, hinge_y, hinge_z]) rotate([0, -90, 0]) pin_geom();
}
